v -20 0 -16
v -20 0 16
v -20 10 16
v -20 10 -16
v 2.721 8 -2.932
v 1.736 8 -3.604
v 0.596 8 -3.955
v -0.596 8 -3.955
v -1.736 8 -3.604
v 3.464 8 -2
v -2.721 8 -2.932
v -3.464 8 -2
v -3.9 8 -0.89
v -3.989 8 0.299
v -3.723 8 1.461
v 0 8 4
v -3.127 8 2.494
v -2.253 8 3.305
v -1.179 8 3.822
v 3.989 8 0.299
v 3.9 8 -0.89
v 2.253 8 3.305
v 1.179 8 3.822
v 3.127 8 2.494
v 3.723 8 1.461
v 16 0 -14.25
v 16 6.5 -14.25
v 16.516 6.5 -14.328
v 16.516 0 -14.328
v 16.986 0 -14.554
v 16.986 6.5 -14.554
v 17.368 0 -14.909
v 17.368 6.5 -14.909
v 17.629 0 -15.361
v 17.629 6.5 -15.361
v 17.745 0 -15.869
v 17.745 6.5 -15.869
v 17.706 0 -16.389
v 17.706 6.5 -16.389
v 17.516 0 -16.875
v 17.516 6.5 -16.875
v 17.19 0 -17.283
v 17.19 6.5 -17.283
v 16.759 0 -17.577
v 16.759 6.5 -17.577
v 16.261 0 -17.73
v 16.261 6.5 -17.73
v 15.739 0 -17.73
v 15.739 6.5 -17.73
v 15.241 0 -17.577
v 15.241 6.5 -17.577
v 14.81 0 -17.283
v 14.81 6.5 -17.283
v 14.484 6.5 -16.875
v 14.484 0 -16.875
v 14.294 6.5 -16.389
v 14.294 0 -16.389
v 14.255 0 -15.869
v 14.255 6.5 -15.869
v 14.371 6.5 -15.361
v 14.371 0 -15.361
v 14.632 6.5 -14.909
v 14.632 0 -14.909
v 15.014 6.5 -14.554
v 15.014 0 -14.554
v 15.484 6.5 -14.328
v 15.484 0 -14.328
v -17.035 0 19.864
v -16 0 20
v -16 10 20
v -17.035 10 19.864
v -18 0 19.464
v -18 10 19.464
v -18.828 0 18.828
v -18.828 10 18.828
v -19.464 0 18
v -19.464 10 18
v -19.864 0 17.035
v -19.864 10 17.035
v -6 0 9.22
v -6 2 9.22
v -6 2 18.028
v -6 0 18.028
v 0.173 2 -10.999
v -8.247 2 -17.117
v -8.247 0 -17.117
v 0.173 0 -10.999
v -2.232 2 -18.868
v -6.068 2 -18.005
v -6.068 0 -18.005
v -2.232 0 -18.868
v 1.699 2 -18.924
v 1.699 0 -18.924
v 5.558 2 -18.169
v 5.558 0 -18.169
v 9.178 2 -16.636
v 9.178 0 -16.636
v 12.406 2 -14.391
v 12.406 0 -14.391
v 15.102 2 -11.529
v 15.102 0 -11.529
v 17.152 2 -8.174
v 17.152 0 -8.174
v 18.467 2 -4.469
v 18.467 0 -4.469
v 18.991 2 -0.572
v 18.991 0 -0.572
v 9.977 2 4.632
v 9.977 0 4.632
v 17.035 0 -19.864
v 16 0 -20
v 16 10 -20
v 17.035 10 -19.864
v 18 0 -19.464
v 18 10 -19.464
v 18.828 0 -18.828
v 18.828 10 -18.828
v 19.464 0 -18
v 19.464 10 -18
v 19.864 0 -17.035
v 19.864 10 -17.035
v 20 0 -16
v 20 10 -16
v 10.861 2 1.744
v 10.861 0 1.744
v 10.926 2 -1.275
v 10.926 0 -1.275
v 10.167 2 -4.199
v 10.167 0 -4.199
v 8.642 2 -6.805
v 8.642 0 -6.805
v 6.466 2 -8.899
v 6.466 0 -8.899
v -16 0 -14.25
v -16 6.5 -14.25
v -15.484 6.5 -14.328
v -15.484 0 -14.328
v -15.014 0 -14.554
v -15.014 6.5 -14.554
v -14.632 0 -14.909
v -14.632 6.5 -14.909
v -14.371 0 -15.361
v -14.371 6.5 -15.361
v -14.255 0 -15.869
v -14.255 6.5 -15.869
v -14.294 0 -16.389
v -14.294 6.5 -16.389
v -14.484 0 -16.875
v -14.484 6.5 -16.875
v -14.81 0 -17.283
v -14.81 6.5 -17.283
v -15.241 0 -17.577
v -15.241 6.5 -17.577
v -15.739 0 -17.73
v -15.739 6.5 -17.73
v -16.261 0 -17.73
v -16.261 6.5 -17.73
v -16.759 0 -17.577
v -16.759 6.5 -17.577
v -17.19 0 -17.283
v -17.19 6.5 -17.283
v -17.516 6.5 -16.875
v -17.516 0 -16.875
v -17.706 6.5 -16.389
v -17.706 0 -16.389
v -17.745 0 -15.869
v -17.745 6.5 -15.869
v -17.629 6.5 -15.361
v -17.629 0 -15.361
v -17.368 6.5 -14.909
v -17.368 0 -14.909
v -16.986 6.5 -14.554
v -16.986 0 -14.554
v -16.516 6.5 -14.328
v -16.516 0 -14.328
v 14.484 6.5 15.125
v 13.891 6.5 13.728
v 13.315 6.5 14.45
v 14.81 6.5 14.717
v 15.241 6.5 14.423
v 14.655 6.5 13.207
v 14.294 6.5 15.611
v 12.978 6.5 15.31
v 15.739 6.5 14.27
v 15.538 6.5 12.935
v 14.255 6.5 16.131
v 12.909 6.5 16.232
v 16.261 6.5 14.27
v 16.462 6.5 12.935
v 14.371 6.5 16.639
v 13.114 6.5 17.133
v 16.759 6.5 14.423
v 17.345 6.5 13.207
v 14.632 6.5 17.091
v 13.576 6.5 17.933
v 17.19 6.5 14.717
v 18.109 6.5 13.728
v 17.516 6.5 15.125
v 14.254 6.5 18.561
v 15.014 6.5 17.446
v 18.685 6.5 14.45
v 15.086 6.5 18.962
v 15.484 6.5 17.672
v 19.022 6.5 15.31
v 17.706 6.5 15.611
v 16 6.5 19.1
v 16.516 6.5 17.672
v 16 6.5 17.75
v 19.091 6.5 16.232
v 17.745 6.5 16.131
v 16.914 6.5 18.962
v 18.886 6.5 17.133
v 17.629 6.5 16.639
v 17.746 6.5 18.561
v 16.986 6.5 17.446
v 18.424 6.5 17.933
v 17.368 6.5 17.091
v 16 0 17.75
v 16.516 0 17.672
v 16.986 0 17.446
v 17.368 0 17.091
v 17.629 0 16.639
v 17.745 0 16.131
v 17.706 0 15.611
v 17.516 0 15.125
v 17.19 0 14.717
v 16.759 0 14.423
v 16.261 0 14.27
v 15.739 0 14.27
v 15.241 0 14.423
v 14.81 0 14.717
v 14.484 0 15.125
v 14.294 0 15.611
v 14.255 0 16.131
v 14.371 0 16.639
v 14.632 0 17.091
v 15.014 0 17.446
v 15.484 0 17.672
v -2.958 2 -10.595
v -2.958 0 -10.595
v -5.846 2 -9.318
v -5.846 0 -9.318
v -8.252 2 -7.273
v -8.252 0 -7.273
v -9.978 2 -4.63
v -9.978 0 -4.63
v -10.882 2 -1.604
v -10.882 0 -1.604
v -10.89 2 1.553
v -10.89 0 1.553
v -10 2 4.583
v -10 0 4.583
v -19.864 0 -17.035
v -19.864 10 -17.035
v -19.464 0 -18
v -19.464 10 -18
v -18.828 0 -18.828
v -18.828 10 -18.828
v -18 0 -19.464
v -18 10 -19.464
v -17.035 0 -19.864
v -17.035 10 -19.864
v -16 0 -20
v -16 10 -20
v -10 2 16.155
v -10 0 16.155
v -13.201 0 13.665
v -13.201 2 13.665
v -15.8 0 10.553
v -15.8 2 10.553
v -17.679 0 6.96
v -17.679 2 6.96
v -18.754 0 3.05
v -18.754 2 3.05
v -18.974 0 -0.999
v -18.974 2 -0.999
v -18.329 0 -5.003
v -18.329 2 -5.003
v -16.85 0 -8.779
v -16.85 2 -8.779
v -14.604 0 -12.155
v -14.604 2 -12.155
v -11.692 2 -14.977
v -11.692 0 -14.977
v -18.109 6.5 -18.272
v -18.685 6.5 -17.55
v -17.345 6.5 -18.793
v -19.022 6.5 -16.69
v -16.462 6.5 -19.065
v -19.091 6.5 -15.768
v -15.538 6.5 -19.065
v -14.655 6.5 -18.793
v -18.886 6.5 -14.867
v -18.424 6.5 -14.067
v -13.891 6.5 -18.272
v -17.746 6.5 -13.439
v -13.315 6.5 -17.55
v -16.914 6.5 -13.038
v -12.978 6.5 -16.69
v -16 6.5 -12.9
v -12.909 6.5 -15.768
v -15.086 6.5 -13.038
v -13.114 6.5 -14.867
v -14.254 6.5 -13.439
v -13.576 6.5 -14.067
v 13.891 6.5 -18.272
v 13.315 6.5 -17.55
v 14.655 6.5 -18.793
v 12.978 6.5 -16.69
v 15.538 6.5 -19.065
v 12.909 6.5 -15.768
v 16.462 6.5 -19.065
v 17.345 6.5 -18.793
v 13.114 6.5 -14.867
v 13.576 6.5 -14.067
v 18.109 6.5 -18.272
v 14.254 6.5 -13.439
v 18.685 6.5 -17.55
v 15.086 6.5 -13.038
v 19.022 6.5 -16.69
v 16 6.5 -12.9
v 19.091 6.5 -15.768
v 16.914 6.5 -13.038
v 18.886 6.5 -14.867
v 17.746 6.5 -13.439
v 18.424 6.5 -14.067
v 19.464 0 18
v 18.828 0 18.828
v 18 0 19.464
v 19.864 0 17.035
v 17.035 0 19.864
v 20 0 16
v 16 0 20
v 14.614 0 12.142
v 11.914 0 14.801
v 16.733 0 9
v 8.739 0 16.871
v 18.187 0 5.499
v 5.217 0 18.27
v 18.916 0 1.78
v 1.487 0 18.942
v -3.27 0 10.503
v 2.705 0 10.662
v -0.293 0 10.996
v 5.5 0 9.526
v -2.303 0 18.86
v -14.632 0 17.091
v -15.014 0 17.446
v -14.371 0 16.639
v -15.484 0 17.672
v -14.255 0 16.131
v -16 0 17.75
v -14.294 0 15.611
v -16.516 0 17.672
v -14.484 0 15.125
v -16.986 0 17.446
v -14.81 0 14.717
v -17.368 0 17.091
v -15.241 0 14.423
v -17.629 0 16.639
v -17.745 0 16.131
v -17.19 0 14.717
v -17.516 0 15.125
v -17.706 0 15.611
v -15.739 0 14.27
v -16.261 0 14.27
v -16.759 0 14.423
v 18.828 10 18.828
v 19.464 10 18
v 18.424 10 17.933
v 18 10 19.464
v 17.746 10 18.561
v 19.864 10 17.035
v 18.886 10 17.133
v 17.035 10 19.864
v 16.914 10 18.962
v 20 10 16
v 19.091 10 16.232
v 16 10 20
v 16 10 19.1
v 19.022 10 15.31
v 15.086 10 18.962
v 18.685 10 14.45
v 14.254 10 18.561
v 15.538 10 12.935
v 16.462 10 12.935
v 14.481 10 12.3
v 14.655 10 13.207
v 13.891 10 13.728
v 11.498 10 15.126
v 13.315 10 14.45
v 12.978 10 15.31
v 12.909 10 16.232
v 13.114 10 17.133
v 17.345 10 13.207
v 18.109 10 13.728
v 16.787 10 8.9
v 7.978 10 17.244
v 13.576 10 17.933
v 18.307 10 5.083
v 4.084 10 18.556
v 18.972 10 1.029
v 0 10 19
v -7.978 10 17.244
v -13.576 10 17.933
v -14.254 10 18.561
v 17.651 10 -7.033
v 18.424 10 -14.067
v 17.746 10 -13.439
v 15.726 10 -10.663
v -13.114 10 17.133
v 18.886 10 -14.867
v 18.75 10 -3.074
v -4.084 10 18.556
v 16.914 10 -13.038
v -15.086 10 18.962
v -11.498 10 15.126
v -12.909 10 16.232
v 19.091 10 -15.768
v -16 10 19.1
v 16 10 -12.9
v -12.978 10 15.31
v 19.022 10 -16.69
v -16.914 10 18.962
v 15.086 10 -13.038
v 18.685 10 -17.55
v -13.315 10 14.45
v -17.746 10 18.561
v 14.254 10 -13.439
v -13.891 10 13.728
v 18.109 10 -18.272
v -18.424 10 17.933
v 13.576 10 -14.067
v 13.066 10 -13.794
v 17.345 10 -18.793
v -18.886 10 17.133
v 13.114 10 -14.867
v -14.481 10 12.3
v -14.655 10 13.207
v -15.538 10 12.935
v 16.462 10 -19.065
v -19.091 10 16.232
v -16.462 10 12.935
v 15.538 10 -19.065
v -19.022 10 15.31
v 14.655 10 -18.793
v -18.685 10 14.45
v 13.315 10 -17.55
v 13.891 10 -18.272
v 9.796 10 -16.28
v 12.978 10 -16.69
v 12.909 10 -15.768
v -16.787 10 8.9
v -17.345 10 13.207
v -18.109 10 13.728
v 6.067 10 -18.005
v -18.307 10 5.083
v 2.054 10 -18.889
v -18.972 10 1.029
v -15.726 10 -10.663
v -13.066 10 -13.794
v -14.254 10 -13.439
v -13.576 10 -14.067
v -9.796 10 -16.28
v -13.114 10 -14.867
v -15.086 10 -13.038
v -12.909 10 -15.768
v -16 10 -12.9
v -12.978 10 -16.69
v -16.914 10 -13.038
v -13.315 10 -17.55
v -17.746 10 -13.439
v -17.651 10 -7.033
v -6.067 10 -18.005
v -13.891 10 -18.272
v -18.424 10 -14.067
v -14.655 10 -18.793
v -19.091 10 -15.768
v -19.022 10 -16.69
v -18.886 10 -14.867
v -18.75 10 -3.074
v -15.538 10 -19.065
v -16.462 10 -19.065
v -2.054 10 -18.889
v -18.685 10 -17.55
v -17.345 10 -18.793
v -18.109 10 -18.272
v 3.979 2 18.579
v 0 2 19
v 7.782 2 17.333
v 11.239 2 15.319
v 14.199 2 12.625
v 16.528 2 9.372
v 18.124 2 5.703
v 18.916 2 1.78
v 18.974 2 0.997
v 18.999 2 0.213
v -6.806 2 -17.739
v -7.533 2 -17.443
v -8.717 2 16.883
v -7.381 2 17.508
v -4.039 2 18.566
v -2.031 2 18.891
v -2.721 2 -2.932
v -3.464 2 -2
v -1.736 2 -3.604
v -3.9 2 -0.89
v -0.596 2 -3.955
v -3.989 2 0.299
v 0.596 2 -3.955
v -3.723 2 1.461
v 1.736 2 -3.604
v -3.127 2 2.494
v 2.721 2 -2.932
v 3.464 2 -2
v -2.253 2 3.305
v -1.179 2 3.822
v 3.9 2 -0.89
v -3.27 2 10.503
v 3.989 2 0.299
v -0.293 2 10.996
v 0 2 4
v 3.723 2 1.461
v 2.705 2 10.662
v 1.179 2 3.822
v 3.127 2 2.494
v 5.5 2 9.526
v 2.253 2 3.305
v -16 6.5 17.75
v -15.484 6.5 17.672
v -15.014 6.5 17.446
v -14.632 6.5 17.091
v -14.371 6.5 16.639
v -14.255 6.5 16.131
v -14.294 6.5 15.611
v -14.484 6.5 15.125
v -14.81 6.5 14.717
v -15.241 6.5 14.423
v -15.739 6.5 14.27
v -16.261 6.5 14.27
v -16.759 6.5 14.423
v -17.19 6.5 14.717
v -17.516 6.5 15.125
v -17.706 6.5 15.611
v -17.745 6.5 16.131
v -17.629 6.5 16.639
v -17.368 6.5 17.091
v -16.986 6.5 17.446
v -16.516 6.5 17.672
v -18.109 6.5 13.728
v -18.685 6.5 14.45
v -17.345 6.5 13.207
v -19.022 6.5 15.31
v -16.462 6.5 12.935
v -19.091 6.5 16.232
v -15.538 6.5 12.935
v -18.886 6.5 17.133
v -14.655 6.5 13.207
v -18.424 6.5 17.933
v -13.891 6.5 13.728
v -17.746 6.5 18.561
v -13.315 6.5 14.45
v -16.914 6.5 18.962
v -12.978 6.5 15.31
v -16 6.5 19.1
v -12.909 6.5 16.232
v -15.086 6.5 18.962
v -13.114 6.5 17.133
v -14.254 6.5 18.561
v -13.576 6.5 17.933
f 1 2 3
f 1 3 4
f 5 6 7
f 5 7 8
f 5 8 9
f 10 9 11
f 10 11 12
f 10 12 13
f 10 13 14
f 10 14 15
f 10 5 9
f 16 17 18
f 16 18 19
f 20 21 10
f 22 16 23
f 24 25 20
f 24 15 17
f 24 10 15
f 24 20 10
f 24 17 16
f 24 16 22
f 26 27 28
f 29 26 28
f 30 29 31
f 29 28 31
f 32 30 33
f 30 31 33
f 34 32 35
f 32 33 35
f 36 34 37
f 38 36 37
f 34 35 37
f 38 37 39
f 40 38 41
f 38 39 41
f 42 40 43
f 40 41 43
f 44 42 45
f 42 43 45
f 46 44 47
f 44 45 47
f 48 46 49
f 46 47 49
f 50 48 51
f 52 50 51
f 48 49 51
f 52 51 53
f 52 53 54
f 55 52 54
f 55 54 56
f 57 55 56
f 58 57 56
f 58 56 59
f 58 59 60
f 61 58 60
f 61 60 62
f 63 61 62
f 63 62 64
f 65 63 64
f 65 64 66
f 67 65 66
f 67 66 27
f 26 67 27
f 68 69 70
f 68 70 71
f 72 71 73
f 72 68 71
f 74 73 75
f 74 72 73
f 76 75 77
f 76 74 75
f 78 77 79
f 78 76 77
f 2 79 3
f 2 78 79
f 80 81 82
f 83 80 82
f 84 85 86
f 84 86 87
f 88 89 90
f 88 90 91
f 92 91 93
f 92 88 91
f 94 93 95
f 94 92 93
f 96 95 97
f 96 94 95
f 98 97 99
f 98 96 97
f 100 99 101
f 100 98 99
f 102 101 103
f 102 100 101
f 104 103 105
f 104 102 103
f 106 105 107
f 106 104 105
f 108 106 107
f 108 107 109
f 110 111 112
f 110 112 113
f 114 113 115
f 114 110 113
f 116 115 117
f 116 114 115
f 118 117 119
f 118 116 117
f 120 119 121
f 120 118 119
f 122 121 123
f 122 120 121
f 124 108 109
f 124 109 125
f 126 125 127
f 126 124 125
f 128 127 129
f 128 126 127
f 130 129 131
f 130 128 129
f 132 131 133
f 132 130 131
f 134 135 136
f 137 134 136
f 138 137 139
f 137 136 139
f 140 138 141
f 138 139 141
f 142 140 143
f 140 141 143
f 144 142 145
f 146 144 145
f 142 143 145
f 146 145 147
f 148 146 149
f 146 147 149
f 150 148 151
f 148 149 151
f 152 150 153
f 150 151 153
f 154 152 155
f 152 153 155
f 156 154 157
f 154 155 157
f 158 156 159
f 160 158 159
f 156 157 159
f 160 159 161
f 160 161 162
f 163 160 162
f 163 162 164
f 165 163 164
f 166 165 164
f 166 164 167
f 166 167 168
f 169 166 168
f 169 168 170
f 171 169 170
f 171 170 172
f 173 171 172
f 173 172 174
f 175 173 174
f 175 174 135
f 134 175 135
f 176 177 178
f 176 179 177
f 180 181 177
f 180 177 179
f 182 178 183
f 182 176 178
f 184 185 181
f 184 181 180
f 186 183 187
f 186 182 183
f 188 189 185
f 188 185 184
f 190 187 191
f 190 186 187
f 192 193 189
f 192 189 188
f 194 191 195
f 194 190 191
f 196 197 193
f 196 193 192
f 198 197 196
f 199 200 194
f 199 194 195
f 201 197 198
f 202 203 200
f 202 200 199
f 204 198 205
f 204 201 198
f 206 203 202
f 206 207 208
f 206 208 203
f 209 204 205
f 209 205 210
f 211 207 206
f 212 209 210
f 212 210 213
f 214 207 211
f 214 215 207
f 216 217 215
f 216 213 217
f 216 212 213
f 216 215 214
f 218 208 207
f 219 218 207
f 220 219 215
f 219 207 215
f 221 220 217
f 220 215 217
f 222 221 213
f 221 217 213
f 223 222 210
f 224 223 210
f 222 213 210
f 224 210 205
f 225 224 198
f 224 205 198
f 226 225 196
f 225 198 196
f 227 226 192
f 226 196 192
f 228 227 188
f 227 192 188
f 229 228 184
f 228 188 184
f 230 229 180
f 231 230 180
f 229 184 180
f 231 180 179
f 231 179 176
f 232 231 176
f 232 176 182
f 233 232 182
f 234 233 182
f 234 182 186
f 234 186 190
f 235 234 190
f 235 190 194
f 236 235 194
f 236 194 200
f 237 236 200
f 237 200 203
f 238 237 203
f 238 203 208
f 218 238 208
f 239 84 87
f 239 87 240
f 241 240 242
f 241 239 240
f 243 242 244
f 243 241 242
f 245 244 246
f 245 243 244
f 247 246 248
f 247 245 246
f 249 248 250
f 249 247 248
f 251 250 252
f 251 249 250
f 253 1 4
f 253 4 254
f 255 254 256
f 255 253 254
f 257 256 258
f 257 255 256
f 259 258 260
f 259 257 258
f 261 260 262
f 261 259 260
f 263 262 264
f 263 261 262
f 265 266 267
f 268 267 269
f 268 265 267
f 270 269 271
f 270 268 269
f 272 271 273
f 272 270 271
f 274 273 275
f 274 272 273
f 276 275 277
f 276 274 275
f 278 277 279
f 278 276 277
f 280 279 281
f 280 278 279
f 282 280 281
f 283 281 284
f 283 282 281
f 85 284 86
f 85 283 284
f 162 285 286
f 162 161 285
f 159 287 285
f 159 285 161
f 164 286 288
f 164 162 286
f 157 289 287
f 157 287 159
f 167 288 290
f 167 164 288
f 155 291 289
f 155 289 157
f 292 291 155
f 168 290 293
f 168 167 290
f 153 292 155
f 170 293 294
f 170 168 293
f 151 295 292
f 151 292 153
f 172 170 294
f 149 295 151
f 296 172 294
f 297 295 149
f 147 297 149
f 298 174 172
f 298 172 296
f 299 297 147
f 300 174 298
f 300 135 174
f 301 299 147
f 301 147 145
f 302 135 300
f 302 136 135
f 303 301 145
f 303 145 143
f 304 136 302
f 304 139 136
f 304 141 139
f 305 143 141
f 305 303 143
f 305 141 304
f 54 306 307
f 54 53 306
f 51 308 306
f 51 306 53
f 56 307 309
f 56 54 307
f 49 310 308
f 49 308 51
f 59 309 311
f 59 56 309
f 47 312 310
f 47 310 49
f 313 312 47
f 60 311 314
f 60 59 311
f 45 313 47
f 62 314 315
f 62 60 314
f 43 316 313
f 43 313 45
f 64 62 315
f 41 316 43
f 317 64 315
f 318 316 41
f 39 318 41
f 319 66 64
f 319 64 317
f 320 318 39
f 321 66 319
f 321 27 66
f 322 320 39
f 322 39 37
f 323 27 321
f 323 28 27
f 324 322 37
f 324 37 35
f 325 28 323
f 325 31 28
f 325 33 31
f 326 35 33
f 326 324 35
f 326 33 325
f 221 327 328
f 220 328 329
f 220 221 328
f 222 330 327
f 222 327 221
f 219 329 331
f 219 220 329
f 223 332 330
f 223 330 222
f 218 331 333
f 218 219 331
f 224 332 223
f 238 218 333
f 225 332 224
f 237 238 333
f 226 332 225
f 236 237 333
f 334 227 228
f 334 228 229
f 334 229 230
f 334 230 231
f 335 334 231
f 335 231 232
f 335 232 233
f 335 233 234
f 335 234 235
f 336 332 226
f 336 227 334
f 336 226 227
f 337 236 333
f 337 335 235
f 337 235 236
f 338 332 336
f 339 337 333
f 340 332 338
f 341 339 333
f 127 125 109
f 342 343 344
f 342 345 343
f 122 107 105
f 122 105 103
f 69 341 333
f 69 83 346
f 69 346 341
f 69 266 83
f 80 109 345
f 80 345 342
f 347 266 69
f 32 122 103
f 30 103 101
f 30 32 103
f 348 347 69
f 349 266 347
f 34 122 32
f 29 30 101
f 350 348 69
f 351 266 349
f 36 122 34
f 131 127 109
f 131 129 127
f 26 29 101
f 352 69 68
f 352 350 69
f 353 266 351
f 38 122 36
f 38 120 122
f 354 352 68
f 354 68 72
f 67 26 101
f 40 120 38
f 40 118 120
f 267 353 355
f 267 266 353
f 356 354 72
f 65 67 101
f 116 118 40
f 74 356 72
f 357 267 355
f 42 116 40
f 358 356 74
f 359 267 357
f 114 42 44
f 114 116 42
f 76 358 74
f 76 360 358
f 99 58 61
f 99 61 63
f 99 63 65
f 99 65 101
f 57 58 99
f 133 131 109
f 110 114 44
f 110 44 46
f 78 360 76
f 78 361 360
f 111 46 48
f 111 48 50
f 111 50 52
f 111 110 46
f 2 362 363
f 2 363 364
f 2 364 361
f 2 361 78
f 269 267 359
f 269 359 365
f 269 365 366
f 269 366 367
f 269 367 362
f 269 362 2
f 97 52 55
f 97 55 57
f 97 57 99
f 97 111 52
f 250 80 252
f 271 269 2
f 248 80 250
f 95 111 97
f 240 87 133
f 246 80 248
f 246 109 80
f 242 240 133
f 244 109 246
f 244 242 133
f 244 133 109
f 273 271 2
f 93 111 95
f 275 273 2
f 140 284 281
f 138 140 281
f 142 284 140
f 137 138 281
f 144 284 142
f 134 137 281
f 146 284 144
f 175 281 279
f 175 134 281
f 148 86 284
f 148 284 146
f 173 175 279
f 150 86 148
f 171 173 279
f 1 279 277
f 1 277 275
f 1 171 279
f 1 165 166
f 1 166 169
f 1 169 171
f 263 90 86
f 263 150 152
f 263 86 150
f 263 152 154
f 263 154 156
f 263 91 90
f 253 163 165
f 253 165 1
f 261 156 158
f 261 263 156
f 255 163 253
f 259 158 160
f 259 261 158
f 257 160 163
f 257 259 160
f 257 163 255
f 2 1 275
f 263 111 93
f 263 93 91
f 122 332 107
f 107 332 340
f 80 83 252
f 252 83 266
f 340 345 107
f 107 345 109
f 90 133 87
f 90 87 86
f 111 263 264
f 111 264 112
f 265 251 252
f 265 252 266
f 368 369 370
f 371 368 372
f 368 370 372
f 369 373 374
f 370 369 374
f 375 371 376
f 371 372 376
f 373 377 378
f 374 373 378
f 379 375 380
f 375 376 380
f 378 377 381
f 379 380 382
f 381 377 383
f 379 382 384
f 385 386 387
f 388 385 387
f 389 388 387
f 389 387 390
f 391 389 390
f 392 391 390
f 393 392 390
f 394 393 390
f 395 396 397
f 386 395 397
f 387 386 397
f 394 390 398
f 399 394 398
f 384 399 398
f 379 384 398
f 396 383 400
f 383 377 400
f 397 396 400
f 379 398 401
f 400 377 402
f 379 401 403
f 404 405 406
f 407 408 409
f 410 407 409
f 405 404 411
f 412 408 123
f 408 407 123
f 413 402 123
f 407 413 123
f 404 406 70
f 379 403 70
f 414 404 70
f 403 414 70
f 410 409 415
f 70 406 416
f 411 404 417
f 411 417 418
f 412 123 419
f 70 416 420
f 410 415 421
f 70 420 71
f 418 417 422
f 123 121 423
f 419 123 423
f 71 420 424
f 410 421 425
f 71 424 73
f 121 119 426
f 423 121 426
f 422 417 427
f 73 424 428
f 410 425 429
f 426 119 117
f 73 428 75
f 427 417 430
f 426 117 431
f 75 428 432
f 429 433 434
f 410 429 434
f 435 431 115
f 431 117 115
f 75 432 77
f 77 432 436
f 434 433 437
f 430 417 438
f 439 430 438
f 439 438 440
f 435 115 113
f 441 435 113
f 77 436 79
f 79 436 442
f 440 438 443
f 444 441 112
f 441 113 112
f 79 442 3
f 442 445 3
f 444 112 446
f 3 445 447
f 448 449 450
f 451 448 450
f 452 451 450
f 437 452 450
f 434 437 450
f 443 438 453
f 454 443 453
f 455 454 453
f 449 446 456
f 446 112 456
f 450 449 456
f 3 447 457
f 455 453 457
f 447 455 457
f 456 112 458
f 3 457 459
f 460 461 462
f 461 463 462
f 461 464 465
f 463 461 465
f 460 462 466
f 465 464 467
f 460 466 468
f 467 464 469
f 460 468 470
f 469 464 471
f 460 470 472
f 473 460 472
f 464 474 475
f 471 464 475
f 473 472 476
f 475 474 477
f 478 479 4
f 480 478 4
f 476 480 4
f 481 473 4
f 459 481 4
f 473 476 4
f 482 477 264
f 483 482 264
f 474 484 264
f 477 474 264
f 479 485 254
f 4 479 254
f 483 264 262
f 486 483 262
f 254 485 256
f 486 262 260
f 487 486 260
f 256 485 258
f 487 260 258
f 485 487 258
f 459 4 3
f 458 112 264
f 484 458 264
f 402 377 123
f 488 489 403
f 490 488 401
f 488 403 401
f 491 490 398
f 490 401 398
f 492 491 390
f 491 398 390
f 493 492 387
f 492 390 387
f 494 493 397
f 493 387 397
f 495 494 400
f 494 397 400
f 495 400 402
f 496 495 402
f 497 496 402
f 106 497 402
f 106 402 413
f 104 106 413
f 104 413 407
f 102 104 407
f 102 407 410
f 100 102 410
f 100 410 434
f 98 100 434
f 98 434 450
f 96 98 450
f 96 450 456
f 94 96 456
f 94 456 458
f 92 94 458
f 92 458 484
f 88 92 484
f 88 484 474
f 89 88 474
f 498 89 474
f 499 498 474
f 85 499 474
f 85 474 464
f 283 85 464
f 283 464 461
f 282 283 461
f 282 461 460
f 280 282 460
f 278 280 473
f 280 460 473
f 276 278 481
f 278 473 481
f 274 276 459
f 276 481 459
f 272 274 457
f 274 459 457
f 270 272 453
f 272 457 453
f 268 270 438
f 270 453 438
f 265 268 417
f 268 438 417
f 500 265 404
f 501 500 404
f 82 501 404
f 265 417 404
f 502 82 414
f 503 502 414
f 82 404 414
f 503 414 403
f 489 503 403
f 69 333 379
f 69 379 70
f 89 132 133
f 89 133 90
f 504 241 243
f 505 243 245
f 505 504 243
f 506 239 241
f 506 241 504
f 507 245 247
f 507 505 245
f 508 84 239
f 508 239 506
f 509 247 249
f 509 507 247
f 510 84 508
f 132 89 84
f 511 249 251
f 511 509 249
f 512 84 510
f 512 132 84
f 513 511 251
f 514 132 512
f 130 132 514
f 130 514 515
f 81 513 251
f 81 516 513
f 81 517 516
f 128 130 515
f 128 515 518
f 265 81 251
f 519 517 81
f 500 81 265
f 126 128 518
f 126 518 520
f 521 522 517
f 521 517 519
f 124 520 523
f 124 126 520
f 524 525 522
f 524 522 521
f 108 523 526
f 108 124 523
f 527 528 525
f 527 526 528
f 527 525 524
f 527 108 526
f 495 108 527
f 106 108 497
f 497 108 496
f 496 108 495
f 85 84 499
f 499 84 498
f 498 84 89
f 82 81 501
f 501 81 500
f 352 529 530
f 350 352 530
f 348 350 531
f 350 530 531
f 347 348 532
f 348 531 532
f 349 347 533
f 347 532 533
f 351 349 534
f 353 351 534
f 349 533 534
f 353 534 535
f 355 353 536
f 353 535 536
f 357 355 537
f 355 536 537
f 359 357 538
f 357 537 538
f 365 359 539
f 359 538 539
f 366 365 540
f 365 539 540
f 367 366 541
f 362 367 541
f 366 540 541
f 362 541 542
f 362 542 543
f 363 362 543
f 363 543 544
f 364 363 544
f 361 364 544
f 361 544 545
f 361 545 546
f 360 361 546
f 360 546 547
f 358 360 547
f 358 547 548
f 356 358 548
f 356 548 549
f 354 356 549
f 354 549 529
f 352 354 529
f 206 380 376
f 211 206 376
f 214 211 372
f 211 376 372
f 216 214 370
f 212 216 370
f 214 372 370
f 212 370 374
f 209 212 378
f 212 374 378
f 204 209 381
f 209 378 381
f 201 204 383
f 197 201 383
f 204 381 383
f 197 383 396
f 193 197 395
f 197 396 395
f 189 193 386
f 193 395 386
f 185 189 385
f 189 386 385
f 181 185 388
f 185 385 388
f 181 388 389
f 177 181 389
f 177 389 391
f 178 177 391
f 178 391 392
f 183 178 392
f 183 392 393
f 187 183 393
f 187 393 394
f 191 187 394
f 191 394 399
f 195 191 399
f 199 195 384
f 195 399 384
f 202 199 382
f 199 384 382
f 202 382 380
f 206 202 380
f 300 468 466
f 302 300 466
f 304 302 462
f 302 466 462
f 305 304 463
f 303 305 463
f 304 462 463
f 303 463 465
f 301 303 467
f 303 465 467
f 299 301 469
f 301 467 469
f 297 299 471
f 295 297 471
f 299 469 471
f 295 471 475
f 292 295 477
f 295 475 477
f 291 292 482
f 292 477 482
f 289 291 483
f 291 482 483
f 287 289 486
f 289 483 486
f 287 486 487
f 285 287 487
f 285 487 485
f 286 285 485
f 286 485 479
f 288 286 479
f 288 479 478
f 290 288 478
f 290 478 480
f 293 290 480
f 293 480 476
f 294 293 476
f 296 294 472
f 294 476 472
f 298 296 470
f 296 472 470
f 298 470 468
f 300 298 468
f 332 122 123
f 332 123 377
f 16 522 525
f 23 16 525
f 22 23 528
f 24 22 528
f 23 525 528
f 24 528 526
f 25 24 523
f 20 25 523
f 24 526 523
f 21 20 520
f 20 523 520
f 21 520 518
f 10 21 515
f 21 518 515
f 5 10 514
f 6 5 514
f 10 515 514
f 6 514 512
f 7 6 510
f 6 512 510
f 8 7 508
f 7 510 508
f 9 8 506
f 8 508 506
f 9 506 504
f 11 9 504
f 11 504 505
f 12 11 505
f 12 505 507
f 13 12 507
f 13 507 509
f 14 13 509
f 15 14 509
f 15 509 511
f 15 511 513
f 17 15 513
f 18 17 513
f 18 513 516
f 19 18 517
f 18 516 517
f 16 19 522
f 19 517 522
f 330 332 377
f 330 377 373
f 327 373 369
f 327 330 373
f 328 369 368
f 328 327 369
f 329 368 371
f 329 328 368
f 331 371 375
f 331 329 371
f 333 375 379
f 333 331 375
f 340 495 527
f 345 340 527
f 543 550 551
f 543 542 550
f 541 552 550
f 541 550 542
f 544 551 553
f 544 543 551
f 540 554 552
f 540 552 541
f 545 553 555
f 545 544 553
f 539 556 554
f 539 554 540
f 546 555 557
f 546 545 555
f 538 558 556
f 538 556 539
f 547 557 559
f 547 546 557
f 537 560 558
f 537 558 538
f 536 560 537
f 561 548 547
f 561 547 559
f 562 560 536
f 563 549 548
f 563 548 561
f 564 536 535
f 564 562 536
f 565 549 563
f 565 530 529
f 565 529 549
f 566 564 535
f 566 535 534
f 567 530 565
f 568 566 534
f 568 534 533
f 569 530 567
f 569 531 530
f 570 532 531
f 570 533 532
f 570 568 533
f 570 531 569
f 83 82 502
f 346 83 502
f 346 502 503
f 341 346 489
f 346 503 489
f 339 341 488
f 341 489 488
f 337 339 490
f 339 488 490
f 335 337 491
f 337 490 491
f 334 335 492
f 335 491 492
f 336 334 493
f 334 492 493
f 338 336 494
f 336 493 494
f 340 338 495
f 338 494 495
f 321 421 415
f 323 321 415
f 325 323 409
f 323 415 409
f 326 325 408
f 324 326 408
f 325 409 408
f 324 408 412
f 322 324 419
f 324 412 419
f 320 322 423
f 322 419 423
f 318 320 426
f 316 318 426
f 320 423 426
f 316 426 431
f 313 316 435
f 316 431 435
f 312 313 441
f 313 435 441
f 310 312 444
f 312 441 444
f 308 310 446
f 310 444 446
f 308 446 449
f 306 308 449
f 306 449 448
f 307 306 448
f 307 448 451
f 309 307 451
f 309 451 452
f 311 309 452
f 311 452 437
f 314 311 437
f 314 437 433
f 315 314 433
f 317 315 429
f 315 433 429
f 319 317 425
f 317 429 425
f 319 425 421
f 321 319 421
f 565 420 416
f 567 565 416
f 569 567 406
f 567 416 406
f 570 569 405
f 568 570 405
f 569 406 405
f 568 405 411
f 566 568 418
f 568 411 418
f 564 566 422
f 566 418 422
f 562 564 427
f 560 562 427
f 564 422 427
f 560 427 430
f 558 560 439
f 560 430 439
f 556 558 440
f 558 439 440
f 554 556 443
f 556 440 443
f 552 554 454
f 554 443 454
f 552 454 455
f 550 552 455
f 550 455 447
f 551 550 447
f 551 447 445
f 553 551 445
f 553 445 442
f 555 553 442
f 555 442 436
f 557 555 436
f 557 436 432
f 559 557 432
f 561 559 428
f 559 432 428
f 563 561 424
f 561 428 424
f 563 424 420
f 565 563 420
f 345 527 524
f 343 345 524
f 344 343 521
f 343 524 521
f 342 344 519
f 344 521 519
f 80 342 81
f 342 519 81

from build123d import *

# Parameters (mm, degrees)
EXTRUDE_1_DEPTH     = 10
SKETCH_2_R          = 19
CUT_EXTRUDE_1_DEPTH = 8
CUT_EXTRUDE_2_DEPTH = 9
SKETCH_4_R          = 1.75
CUT_EXTRUDE_3_DEPTH = 31
SKETCH_5_R          = 3.1
CUT_EXTRUDE_4_DEPTH = 3.5
SKETCH_6_R          = 4
EXTRUDE_2_DEPTH     = 6


with BuildPart() as part:
    # Эскиз1 → Бобышка-Вытянуть1 (new body)
    with BuildSketch(Plane(origin=(0, 0, 0), x_dir=(1, 0, 0), z_dir=(0, 1, 0))):
        with BuildLine():
            Line((16, -20), (-16, -20))
            ThreePointArc((-16, -20), (-18.828427125, -18.828427125), (-20, -16))
            Line((-20, -16), (-20, 16))
            ThreePointArc((-20, 16), (-18.828427125, 18.828427125), (-16, 20))
            Line((-16, 20), (16, 20))
            ThreePointArc((16, 20), (18.828427125, 18.828427125), (20, 16))
            Line((20, 16), (20, -16))
            ThreePointArc((20, -16), (18.828427125, -18.828427125), (16, -20))
        make_face()
    extrude(amount=EXTRUDE_1_DEPTH)

    # Эскиз2 → Вырез-Вытянуть1 (cut)
    with BuildSketch(Plane(origin=(0, 10, 0), x_dir=(1, 0, 0), z_dir=(0, 1, 0))):
        with Locations(Location((0, 0, 0), (0, 0, 270))):
            Circle(SKETCH_2_R)
    extrude(amount=-CUT_EXTRUDE_1_DEPTH, mode=Mode.SUBTRACT)

    # Эскиз3 → Вырез-Вытянуть2 (cut)
    with BuildSketch(Plane(origin=(0, 2, 0), x_dir=(1, 0, 0), z_dir=(0, 1, 0))):
        with BuildLine():
            Line((-10, -4.582575695), (-10, -16.155494421))
            ThreePointArc((-10, -16.155494421), (-18.973695145, 0.999446125), (-8.247376329, 17.116681445))
            Line((-8.247376329, 17.116681445), (0.173394535, 10.998633294))
            ThreePointArc((0.173394535, 10.998633294), (-9.210540816, 6.013812257), (-10, -4.582575695))
        make_face()
        with BuildLine():
            Line((-6, -9.219544457), (-6, -18.027756377))
            ThreePointArc((-6, -18.027756377), (10.378017833, -15.915299113), (18.916407865, -1.780312749))
            Line((18.916407865, -1.780312749), (5.5, -9.526279442))
            ThreePointArc((5.5, -9.526279442), (-0.29329437, -10.996089233), (-6, -9.219544457))
        make_face()
        with BuildLine():
            Line((6.465637775, 8.899186938), (-6.067599609, 18.005116911))
            ThreePointArc((-6.067599609, 18.005116911), (10.850398881, 15.597078064), (18.991376746, 0.572371631))
            Line((18.991376746, 0.572371631), (9.977225575, -4.631950974))
            ThreePointArc((9.977225575, -4.631950974), (10.647293651, 2.763175331), (6.465637775, 8.899186938))
        make_face()
    extrude(amount=-CUT_EXTRUDE_2_DEPTH, mode=Mode.SUBTRACT)

    # Эскиз4 → Вырез-Вытянуть3 (cut, through all)
    with BuildSketch(Plane(origin=(0, 10, 0), x_dir=(1, 0, 0), z_dir=(0, 1, 0))):
        with Locations(Location((-16, 16, 0), (0, 0, 270))):
            Circle(SKETCH_4_R)
        with Locations(Location((16, 16, 0), (0, 0, 270))):
            Circle(SKETCH_4_R)
        with Locations(Location((-16, -16, 0), (0, 0, 270))):
            Circle(SKETCH_4_R)
        with Locations(Location((16, -16, 0), (0, 0, 270))):
            Circle(SKETCH_4_R)
    extrude(amount=-CUT_EXTRUDE_3_DEPTH, mode=Mode.SUBTRACT)

    # Эскиз5 → Вырез-Вытянуть4 (cut)
    with BuildSketch(Plane(origin=(0, 10, 0), x_dir=(1, 0, 0), z_dir=(0, 1, 0))):
        with Locations(Location((-16, 16, 0), (0, 0, 270))):
            Circle(SKETCH_5_R)
        with Locations(Location((16, 16, 0), (0, 0, 270))):
            Circle(SKETCH_5_R)
        with Locations(Location((16, -16, 0), (0, 0, 270))):
            Circle(SKETCH_5_R)
        with Locations(Location((-16, -16, 0), (0, 0, 270))):
            Circle(SKETCH_5_R)
    extrude(amount=-CUT_EXTRUDE_4_DEPTH, mode=Mode.SUBTRACT)

    # Эскиз6 → Бобышка-Вытянуть2 (add)
    with BuildSketch(Plane(origin=(0, 2, 0), x_dir=(1, 0, 0), z_dir=(0, 1, 0))):
        with Locations(Location((0, 0, 0), (0, 0, 270))):
            Circle(SKETCH_6_R)
    extrude(amount=EXTRUDE_2_DEPTH)


solid = part.part
